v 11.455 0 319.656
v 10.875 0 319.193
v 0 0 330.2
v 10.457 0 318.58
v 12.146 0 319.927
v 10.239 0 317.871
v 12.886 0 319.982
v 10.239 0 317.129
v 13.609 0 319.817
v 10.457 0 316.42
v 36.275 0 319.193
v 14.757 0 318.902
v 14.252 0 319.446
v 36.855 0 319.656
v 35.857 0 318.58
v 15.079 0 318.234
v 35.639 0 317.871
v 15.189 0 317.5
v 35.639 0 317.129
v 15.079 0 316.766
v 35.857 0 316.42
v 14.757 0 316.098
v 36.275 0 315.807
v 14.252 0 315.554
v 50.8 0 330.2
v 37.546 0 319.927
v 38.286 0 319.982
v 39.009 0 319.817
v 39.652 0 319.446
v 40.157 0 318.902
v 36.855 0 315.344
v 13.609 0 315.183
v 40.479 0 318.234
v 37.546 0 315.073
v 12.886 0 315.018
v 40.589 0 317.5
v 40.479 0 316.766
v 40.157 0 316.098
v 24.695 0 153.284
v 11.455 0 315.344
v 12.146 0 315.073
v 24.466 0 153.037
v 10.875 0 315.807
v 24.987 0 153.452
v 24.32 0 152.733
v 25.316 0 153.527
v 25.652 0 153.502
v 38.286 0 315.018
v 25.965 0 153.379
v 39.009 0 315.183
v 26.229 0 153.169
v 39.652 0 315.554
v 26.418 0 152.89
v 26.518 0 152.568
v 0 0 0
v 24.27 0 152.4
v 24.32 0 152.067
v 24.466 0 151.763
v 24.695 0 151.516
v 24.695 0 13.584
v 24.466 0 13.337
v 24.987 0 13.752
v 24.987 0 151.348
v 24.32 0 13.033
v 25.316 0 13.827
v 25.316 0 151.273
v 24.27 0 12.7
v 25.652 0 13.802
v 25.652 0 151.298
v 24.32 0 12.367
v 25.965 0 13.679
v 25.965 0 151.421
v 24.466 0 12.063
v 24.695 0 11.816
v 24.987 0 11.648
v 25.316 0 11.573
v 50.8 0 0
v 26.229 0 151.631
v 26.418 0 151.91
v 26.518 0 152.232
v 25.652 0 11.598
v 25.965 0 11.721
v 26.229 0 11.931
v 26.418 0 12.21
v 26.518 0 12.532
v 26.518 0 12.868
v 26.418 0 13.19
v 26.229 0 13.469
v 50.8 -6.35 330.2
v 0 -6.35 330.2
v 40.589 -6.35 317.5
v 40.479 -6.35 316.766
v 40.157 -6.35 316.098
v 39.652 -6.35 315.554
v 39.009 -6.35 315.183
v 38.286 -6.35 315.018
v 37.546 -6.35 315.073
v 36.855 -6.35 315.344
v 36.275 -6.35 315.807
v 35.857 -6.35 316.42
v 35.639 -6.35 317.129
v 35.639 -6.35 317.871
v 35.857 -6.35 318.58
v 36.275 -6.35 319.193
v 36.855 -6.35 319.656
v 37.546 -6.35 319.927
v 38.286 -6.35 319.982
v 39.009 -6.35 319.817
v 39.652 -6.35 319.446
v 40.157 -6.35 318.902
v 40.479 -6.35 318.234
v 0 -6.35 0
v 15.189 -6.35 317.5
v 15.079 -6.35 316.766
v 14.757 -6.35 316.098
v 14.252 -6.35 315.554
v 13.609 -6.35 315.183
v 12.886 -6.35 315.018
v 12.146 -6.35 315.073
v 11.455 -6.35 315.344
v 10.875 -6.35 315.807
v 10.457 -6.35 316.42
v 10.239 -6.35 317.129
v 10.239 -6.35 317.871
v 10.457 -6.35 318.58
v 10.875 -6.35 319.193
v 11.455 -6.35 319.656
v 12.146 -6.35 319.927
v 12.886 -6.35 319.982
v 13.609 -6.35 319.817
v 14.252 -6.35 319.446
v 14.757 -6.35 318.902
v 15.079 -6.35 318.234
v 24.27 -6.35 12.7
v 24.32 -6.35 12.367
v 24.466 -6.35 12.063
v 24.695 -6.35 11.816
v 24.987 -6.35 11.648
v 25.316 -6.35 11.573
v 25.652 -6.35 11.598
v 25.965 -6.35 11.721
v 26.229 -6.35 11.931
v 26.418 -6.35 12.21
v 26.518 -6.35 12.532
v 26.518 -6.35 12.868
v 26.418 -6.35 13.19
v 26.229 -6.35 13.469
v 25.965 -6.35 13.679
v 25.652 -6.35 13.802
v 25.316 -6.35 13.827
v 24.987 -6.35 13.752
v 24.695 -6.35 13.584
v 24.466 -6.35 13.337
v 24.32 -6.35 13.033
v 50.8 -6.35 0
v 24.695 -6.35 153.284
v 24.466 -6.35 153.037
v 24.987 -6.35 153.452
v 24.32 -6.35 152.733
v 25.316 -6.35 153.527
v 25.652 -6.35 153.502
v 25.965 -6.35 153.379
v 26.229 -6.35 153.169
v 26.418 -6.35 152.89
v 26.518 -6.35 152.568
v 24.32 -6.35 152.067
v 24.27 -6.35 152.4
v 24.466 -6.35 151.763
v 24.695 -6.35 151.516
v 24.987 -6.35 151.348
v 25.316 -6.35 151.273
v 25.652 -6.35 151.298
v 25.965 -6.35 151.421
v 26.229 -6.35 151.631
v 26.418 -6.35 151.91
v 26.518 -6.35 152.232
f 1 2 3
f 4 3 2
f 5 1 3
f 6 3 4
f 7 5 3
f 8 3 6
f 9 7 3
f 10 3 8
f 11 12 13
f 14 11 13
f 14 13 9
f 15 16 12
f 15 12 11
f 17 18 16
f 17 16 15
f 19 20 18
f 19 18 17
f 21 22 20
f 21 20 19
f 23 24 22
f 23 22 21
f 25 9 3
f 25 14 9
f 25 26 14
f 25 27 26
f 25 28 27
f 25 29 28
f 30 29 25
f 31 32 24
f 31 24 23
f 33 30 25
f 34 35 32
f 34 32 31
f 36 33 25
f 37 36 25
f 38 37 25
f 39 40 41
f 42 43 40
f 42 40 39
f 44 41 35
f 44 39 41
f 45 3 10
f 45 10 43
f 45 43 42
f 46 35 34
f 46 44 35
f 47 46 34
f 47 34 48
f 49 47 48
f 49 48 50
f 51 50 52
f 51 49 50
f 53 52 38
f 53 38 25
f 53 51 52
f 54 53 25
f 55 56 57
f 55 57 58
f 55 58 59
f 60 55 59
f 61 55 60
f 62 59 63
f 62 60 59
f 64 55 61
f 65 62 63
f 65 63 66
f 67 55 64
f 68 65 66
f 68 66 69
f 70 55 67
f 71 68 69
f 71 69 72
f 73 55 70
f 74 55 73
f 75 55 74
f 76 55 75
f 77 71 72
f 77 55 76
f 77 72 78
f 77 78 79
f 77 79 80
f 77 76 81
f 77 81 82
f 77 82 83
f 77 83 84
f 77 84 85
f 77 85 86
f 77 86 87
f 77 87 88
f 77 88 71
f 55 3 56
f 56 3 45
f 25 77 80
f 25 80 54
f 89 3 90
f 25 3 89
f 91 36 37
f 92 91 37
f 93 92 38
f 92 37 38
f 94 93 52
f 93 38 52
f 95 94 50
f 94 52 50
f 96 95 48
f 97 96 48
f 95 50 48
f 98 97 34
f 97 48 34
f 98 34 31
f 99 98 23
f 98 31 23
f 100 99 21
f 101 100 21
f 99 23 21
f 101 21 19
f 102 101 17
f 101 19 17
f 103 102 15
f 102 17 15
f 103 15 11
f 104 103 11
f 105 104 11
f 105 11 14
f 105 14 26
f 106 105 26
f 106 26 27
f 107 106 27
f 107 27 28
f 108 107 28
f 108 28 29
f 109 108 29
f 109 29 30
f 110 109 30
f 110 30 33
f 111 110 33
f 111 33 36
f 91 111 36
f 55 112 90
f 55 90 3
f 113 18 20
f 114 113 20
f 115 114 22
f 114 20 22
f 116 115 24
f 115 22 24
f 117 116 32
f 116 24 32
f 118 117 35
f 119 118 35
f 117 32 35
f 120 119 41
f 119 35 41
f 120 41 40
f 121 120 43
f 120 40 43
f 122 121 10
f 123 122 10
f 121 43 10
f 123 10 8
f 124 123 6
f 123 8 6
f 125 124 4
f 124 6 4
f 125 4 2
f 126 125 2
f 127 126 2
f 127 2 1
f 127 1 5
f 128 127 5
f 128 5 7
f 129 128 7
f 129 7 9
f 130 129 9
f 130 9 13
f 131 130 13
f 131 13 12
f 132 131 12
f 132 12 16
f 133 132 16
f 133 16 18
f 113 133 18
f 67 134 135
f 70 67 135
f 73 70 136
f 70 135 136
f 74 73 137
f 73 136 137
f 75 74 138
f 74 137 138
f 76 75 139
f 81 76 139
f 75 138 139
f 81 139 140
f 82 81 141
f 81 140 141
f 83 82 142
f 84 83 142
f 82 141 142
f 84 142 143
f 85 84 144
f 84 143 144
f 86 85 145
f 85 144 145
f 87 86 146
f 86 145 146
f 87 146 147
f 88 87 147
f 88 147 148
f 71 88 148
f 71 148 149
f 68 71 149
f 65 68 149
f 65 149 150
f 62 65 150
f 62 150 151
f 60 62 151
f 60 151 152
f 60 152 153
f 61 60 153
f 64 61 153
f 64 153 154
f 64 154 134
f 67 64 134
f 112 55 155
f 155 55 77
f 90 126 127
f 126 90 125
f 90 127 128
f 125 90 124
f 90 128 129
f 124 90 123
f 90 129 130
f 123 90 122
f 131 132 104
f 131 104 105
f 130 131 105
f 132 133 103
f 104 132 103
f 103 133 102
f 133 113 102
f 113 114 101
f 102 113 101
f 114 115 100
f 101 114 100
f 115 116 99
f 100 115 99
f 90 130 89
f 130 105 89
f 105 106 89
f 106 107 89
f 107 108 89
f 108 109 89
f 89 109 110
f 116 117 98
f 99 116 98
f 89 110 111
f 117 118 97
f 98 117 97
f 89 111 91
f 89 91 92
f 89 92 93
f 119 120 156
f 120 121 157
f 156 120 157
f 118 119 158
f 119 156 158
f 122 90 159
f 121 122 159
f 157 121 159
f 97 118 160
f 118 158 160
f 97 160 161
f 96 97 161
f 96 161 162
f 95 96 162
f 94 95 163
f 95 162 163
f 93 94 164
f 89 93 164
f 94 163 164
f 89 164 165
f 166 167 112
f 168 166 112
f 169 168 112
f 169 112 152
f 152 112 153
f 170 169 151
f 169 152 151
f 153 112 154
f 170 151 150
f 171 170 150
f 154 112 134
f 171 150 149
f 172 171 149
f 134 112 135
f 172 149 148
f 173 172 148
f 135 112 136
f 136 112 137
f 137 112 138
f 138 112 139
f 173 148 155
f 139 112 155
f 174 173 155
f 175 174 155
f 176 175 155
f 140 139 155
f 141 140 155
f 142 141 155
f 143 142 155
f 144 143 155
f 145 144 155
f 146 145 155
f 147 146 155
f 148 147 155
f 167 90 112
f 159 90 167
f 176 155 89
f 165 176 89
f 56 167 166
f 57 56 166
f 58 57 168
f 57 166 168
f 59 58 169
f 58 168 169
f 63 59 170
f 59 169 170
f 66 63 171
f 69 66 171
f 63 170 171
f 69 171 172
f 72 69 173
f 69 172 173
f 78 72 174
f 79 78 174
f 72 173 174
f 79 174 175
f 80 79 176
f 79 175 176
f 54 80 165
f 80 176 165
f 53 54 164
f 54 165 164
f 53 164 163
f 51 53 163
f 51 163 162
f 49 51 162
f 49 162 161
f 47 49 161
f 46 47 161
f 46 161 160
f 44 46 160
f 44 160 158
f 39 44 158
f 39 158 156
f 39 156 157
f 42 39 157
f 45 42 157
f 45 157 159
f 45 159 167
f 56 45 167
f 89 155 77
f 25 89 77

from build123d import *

# Parameters (mm, degrees)
SKETCH1_W                 = 50.8
SKETCH1_H                 = 6.35
EXTRUDE_THIN1_DEPTH       = 330.2
SKETCH3_R                 = 2.4892
CUT_EXTRUDE1_DEPTH        = 7.35
F_4_40_TAPPED_HOLE1_D     = 2.2606
F_4_40_TAPPED_HOLE1_DEPTH = 7.62
F_4_40_TAPPED_HOLE1_TIP   = 0.679152758


with BuildPart() as part:
    # Sketch1 → Extrude-Thin1 (new body)
    with BuildSketch(Plane.XY):
        with Locations((25.4, -3.175)):
            Rectangle(SKETCH1_W, SKETCH1_H)
    extrude(amount=EXTRUDE_THIN1_DEPTH)

    # Sketch3 → Cut-Extrude1 (cut, through all)
    with BuildSketch(Plane(origin=(0, 0, 0), x_dir=(1, 0, 0), z_dir=(0, 1, 0))):
        with Locations((12.7, -317.5)):
            Circle(SKETCH3_R)
        with Locations((38.1, -317.5)):
            Circle(SKETCH3_R)
    extrude(amount=-CUT_EXTRUDE1_DEPTH, mode=Mode.SUBTRACT)

    # #4-40 Tapped Hole1
    with Locations(Plane(origin=(0, 0, 0), x_dir=(1, 0, 0), z_dir=(0, 1, 0))):
        with Locations((25.4, -152.4), (25.4, -12.7)):
            Hole(F_4_40_TAPPED_HOLE1_D / 2, depth=F_4_40_TAPPED_HOLE1_DEPTH)
            with Locations((0, 0, -(F_4_40_TAPPED_HOLE1_DEPTH + F_4_40_TAPPED_HOLE1_TIP / 2))):  # 118° drill point
                Cone(0, F_4_40_TAPPED_HOLE1_D / 2, F_4_40_TAPPED_HOLE1_TIP, mode=Mode.SUBTRACT)


solid = part.part
